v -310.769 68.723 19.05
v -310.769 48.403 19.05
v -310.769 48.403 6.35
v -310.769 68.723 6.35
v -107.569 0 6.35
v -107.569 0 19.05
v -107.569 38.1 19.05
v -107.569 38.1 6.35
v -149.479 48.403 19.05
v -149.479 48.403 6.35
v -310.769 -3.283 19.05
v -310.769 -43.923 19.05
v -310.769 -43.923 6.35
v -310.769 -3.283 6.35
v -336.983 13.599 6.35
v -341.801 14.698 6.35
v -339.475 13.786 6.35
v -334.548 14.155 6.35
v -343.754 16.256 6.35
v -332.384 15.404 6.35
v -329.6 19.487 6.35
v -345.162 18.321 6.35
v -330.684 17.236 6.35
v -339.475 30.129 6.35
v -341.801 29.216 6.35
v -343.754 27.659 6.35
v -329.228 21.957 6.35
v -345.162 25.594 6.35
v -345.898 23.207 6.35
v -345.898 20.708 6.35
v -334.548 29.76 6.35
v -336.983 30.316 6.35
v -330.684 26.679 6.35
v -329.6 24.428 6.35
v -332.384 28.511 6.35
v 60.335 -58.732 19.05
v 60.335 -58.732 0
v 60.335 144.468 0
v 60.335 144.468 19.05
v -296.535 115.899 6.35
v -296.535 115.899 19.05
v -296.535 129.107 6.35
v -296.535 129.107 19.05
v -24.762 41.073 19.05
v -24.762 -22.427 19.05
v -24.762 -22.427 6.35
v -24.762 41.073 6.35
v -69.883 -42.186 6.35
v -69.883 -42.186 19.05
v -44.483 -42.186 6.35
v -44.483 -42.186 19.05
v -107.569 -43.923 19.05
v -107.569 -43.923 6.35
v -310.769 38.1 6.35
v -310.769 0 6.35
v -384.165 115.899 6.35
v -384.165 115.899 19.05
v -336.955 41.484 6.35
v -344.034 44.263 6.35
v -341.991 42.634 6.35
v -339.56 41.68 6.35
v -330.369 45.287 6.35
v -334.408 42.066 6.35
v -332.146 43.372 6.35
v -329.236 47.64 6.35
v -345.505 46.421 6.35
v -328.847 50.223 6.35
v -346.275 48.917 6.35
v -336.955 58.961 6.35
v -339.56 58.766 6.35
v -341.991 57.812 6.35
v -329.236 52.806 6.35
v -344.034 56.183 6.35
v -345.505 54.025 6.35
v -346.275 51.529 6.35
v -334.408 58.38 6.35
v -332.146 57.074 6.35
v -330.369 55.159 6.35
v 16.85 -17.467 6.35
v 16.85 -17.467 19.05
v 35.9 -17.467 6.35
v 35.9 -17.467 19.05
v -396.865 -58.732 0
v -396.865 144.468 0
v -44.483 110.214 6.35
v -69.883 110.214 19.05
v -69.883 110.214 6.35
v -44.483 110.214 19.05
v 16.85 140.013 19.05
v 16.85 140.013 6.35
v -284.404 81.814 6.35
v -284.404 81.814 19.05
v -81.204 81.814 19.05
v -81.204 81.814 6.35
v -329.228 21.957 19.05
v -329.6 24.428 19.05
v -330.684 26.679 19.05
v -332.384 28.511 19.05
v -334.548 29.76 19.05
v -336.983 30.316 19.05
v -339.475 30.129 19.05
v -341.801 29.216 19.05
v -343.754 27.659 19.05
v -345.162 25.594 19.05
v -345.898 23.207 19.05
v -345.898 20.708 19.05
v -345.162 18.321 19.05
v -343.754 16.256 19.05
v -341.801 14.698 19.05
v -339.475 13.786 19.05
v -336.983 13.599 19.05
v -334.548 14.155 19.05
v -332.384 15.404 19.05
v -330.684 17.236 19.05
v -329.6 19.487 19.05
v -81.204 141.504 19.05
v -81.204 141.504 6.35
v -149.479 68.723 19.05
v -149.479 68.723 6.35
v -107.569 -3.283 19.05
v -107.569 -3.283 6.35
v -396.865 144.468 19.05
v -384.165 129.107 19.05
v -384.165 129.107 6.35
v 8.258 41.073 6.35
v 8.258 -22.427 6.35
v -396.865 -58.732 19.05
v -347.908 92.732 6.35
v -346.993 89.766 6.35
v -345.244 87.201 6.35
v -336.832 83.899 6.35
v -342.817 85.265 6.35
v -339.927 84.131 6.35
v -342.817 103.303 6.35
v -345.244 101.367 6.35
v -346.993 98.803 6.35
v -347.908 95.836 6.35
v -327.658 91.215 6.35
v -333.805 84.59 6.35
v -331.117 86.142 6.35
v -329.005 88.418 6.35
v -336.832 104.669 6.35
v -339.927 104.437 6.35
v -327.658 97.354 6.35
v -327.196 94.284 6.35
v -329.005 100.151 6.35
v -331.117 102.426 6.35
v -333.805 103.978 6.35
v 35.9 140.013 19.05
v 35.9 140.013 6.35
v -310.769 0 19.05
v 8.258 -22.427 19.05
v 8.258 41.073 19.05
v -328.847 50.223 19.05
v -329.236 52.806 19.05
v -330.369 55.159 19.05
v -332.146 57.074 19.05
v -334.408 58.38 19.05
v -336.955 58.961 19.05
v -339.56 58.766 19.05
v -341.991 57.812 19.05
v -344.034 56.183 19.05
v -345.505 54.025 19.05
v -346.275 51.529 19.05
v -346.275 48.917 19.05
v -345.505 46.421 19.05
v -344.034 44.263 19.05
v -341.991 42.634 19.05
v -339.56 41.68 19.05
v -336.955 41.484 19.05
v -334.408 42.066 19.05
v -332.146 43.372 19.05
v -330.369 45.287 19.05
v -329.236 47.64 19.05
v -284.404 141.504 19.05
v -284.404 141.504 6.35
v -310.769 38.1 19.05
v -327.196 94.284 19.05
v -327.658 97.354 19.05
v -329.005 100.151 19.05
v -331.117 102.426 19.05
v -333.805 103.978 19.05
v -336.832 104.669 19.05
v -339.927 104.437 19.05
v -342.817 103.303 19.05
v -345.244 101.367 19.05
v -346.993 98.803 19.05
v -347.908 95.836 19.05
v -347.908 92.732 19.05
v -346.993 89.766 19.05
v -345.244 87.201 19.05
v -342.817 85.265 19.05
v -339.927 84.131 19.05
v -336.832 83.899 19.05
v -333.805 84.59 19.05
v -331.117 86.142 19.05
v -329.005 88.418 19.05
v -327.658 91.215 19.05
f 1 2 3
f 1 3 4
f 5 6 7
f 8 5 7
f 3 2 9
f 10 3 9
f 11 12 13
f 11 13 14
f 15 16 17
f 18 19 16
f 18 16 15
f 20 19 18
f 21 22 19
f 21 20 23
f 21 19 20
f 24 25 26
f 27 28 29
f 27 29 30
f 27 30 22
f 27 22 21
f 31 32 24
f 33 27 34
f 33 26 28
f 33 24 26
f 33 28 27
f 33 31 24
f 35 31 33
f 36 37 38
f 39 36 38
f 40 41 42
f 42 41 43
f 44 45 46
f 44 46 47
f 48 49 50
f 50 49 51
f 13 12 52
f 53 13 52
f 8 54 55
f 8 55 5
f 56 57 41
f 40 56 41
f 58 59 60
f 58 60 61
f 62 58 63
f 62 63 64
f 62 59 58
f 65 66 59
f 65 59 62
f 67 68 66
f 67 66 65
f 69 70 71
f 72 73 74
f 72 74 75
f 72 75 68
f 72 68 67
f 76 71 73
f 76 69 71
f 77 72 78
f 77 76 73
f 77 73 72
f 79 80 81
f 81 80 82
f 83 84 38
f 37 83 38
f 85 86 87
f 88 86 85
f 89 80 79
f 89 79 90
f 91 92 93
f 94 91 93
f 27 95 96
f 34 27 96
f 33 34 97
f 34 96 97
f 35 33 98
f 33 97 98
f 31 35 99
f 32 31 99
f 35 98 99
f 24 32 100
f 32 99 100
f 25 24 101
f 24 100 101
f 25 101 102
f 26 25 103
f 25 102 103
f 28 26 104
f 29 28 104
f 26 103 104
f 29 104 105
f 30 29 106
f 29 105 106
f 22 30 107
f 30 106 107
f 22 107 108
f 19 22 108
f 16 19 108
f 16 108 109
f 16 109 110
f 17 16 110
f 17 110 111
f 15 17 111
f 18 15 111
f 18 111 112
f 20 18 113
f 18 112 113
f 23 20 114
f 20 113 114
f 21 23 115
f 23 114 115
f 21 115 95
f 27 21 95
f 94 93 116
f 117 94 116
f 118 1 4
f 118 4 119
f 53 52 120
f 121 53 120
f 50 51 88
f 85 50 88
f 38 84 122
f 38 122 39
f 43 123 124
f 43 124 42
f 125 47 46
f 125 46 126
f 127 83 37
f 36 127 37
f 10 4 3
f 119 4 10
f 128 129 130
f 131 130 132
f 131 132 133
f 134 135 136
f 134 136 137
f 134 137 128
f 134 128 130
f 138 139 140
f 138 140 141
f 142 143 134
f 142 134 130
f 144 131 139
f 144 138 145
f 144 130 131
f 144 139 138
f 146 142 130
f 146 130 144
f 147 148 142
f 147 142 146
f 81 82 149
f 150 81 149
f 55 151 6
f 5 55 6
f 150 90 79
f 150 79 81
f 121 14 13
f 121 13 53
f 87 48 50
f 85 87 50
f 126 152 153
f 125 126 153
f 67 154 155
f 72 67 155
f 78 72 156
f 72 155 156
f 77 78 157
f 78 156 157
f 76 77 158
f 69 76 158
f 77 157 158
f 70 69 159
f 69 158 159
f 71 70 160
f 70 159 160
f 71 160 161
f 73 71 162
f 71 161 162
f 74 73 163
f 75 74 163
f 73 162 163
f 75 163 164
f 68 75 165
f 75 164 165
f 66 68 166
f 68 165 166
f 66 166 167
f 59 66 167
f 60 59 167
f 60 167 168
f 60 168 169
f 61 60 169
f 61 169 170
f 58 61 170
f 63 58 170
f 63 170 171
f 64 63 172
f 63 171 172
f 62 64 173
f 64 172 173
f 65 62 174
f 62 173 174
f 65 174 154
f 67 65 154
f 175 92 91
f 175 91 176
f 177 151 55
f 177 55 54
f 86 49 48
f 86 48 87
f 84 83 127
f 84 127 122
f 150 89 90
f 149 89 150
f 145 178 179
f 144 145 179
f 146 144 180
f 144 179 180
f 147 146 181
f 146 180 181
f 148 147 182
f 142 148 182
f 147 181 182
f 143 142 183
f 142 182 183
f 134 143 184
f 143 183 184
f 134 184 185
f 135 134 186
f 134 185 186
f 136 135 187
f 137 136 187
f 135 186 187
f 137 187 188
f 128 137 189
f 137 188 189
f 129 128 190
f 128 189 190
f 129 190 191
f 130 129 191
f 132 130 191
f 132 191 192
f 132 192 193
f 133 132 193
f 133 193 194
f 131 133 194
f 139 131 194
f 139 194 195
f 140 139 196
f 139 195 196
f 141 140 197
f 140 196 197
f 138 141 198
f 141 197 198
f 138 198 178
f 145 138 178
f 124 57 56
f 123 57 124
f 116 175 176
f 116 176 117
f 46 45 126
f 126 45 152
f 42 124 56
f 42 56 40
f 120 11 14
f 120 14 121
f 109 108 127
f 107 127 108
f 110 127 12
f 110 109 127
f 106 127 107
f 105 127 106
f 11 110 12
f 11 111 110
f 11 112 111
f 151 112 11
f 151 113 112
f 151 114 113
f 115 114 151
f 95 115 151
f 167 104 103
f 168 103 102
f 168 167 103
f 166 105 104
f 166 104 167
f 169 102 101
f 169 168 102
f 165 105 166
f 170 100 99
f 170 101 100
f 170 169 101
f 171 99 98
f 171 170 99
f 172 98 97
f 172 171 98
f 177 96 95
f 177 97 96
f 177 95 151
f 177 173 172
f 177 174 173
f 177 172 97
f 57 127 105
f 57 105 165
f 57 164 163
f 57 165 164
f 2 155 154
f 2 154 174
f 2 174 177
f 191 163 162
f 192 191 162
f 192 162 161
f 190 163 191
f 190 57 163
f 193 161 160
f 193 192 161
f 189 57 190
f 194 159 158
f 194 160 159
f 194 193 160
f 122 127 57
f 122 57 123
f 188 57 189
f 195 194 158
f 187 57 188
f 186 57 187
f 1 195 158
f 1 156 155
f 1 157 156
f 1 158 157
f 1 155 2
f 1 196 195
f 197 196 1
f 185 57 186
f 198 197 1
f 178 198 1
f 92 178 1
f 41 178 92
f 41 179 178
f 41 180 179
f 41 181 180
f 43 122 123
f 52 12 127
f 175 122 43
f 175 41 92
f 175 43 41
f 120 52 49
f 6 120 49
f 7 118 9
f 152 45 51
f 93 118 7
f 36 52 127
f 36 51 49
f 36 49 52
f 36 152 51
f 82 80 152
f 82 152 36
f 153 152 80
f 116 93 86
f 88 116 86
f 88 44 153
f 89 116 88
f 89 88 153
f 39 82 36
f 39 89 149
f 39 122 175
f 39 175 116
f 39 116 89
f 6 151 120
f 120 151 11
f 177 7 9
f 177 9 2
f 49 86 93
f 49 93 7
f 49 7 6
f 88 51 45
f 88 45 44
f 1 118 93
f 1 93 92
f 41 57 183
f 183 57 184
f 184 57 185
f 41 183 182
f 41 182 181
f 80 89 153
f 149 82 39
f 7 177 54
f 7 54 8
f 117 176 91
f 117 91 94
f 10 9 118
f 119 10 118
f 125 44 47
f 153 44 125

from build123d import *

# Parameters (mm, degrees)
F0_W      = 457.2
F0_H      = 203.2
F1_DEPTH  = 19.05
F2_W      = 203.2
F2_H      = 59.69
F3_R      = 10.414
F3_R_2    = 8.763
F3_R_3    = 8.382
F5_DEPTH  = 19.05
F6_W      = 87.63
F6_H      = 13.208
F11_DEPTH = 12.7
F8_W      = 161.29
F8_H      = 20.32
F8_W_2    = 203.2
F8_H_2    = 38.1
F8_H_3    = 40.64
F12_DEPTH = 12.7
F9_W      = 25.4
F9_H      = 152.4
F10_W     = 33.02
F10_H     = 63.5
F13_DEPTH = 12.7
F7_W      = 19.05
F7_H      = 157.48
F14_DEPTH = 12.7
F15_DEPTH = 12.7
F16_DEPTH = 12.7


# Not quite as in the source:
# - the program builds the solid bodies; features that only make, move or delete a surface that nothing else refers to are left out


with BuildPart() as f1:
    # F0 (on Top) → F1 (new body)
    with BuildSketch(Plane.XY):
        with Locations((-168.2645873785, 42.8677027285)):
            Rectangle(F0_W, F0_H)
    extrude(amount=F1_DEPTH)

    # F2 (on face) + F3 (on face) → F5 (join)
    with BuildSketch(Plane.XY.offset(19.05)):
        with Locations((-182.8039201736, 111.6589910698)):
            Rectangle(F2_W, F2_H)
    with BuildSketch(Plane.XY.offset(19.05)):
        with Locations((-337.6098275185, 94.2841172218)):
            Circle(F3_R)
        with Locations((-337.6098275185, 50.222992897)):
            Circle(F3_R_2)
        with Locations((-337.6098275185, 21.9573695213)):
            Circle(F3_R_3)
    extrude(amount=-F5_DEPTH)

    # F6 (on face) → F11 (cut)
    with BuildSketch(Plane.XY.offset(19.05)):
        with Locations((-340.3499591923, 122.5030114927)):
            Rectangle(F6_W, F6_H)
    extrude(amount=-F11_DEPTH, mode=Mode.SUBTRACT)

    # F8 (on face) → F12 (cut)
    with BuildSketch(Plane.XY.offset(19.05)):
        with Locations((-230.1238527489, 58.5634791589)):
            Rectangle(F8_W, F8_H)
        with Locations((-209.1688527489, 19.05)):
            Rectangle(F8_W_2, F8_H_2)
        with Locations((-209.1688527489, -23.6032848585)):
            Rectangle(F8_W_2, F8_H_3)
    extrude(amount=-F12_DEPTH, mode=Mode.SUBTRACT)

    # F9 (on face) + F10 (on face) → F13 (cut)
    with BuildSketch(Plane.XY.offset(19.05)):
        with Locations((-57.1830842316, 34.0140676022)):
            Rectangle(F9_W, F9_H)
    with BuildSketch(Plane.XY.offset(19.05)):
        with Locations((-8.2516423559, 9.3228359818)):
            Rectangle(F10_W, F10_H)
    extrude(amount=-F13_DEPTH, mode=Mode.SUBTRACT)

    # F7 (on face) → F14 (cut)
    with BuildSketch(Plane.XY.offset(19.05)):
        with Locations((26.3747599661, 61.2730749154)):
            Rectangle(F7_W, F7_H)
    extrude(amount=-F14_DEPTH, mode=Mode.SUBTRACT)

    # F2 (on face) → F15 (cut)
    with BuildSketch(Plane.XY.offset(19.05)):
        with Locations((-182.8039201736, 111.6589910698)):
            Rectangle(F2_W, F2_H)
    extrude(amount=-F15_DEPTH, mode=Mode.SUBTRACT)

    # F3 (on face) → F16 (cut)
    with BuildSketch(Plane.XY.offset(19.05)):
        with Locations((-337.6098275185, 94.2841172218)):
            Circle(F3_R)
        with Locations((-337.6098275185, 50.222992897)):
            Circle(F3_R_2)
        with Locations((-337.6098275185, 21.9573695213)):
            Circle(F3_R_3)
    extrude(amount=-F16_DEPTH, mode=Mode.SUBTRACT)


solid = f1.part
